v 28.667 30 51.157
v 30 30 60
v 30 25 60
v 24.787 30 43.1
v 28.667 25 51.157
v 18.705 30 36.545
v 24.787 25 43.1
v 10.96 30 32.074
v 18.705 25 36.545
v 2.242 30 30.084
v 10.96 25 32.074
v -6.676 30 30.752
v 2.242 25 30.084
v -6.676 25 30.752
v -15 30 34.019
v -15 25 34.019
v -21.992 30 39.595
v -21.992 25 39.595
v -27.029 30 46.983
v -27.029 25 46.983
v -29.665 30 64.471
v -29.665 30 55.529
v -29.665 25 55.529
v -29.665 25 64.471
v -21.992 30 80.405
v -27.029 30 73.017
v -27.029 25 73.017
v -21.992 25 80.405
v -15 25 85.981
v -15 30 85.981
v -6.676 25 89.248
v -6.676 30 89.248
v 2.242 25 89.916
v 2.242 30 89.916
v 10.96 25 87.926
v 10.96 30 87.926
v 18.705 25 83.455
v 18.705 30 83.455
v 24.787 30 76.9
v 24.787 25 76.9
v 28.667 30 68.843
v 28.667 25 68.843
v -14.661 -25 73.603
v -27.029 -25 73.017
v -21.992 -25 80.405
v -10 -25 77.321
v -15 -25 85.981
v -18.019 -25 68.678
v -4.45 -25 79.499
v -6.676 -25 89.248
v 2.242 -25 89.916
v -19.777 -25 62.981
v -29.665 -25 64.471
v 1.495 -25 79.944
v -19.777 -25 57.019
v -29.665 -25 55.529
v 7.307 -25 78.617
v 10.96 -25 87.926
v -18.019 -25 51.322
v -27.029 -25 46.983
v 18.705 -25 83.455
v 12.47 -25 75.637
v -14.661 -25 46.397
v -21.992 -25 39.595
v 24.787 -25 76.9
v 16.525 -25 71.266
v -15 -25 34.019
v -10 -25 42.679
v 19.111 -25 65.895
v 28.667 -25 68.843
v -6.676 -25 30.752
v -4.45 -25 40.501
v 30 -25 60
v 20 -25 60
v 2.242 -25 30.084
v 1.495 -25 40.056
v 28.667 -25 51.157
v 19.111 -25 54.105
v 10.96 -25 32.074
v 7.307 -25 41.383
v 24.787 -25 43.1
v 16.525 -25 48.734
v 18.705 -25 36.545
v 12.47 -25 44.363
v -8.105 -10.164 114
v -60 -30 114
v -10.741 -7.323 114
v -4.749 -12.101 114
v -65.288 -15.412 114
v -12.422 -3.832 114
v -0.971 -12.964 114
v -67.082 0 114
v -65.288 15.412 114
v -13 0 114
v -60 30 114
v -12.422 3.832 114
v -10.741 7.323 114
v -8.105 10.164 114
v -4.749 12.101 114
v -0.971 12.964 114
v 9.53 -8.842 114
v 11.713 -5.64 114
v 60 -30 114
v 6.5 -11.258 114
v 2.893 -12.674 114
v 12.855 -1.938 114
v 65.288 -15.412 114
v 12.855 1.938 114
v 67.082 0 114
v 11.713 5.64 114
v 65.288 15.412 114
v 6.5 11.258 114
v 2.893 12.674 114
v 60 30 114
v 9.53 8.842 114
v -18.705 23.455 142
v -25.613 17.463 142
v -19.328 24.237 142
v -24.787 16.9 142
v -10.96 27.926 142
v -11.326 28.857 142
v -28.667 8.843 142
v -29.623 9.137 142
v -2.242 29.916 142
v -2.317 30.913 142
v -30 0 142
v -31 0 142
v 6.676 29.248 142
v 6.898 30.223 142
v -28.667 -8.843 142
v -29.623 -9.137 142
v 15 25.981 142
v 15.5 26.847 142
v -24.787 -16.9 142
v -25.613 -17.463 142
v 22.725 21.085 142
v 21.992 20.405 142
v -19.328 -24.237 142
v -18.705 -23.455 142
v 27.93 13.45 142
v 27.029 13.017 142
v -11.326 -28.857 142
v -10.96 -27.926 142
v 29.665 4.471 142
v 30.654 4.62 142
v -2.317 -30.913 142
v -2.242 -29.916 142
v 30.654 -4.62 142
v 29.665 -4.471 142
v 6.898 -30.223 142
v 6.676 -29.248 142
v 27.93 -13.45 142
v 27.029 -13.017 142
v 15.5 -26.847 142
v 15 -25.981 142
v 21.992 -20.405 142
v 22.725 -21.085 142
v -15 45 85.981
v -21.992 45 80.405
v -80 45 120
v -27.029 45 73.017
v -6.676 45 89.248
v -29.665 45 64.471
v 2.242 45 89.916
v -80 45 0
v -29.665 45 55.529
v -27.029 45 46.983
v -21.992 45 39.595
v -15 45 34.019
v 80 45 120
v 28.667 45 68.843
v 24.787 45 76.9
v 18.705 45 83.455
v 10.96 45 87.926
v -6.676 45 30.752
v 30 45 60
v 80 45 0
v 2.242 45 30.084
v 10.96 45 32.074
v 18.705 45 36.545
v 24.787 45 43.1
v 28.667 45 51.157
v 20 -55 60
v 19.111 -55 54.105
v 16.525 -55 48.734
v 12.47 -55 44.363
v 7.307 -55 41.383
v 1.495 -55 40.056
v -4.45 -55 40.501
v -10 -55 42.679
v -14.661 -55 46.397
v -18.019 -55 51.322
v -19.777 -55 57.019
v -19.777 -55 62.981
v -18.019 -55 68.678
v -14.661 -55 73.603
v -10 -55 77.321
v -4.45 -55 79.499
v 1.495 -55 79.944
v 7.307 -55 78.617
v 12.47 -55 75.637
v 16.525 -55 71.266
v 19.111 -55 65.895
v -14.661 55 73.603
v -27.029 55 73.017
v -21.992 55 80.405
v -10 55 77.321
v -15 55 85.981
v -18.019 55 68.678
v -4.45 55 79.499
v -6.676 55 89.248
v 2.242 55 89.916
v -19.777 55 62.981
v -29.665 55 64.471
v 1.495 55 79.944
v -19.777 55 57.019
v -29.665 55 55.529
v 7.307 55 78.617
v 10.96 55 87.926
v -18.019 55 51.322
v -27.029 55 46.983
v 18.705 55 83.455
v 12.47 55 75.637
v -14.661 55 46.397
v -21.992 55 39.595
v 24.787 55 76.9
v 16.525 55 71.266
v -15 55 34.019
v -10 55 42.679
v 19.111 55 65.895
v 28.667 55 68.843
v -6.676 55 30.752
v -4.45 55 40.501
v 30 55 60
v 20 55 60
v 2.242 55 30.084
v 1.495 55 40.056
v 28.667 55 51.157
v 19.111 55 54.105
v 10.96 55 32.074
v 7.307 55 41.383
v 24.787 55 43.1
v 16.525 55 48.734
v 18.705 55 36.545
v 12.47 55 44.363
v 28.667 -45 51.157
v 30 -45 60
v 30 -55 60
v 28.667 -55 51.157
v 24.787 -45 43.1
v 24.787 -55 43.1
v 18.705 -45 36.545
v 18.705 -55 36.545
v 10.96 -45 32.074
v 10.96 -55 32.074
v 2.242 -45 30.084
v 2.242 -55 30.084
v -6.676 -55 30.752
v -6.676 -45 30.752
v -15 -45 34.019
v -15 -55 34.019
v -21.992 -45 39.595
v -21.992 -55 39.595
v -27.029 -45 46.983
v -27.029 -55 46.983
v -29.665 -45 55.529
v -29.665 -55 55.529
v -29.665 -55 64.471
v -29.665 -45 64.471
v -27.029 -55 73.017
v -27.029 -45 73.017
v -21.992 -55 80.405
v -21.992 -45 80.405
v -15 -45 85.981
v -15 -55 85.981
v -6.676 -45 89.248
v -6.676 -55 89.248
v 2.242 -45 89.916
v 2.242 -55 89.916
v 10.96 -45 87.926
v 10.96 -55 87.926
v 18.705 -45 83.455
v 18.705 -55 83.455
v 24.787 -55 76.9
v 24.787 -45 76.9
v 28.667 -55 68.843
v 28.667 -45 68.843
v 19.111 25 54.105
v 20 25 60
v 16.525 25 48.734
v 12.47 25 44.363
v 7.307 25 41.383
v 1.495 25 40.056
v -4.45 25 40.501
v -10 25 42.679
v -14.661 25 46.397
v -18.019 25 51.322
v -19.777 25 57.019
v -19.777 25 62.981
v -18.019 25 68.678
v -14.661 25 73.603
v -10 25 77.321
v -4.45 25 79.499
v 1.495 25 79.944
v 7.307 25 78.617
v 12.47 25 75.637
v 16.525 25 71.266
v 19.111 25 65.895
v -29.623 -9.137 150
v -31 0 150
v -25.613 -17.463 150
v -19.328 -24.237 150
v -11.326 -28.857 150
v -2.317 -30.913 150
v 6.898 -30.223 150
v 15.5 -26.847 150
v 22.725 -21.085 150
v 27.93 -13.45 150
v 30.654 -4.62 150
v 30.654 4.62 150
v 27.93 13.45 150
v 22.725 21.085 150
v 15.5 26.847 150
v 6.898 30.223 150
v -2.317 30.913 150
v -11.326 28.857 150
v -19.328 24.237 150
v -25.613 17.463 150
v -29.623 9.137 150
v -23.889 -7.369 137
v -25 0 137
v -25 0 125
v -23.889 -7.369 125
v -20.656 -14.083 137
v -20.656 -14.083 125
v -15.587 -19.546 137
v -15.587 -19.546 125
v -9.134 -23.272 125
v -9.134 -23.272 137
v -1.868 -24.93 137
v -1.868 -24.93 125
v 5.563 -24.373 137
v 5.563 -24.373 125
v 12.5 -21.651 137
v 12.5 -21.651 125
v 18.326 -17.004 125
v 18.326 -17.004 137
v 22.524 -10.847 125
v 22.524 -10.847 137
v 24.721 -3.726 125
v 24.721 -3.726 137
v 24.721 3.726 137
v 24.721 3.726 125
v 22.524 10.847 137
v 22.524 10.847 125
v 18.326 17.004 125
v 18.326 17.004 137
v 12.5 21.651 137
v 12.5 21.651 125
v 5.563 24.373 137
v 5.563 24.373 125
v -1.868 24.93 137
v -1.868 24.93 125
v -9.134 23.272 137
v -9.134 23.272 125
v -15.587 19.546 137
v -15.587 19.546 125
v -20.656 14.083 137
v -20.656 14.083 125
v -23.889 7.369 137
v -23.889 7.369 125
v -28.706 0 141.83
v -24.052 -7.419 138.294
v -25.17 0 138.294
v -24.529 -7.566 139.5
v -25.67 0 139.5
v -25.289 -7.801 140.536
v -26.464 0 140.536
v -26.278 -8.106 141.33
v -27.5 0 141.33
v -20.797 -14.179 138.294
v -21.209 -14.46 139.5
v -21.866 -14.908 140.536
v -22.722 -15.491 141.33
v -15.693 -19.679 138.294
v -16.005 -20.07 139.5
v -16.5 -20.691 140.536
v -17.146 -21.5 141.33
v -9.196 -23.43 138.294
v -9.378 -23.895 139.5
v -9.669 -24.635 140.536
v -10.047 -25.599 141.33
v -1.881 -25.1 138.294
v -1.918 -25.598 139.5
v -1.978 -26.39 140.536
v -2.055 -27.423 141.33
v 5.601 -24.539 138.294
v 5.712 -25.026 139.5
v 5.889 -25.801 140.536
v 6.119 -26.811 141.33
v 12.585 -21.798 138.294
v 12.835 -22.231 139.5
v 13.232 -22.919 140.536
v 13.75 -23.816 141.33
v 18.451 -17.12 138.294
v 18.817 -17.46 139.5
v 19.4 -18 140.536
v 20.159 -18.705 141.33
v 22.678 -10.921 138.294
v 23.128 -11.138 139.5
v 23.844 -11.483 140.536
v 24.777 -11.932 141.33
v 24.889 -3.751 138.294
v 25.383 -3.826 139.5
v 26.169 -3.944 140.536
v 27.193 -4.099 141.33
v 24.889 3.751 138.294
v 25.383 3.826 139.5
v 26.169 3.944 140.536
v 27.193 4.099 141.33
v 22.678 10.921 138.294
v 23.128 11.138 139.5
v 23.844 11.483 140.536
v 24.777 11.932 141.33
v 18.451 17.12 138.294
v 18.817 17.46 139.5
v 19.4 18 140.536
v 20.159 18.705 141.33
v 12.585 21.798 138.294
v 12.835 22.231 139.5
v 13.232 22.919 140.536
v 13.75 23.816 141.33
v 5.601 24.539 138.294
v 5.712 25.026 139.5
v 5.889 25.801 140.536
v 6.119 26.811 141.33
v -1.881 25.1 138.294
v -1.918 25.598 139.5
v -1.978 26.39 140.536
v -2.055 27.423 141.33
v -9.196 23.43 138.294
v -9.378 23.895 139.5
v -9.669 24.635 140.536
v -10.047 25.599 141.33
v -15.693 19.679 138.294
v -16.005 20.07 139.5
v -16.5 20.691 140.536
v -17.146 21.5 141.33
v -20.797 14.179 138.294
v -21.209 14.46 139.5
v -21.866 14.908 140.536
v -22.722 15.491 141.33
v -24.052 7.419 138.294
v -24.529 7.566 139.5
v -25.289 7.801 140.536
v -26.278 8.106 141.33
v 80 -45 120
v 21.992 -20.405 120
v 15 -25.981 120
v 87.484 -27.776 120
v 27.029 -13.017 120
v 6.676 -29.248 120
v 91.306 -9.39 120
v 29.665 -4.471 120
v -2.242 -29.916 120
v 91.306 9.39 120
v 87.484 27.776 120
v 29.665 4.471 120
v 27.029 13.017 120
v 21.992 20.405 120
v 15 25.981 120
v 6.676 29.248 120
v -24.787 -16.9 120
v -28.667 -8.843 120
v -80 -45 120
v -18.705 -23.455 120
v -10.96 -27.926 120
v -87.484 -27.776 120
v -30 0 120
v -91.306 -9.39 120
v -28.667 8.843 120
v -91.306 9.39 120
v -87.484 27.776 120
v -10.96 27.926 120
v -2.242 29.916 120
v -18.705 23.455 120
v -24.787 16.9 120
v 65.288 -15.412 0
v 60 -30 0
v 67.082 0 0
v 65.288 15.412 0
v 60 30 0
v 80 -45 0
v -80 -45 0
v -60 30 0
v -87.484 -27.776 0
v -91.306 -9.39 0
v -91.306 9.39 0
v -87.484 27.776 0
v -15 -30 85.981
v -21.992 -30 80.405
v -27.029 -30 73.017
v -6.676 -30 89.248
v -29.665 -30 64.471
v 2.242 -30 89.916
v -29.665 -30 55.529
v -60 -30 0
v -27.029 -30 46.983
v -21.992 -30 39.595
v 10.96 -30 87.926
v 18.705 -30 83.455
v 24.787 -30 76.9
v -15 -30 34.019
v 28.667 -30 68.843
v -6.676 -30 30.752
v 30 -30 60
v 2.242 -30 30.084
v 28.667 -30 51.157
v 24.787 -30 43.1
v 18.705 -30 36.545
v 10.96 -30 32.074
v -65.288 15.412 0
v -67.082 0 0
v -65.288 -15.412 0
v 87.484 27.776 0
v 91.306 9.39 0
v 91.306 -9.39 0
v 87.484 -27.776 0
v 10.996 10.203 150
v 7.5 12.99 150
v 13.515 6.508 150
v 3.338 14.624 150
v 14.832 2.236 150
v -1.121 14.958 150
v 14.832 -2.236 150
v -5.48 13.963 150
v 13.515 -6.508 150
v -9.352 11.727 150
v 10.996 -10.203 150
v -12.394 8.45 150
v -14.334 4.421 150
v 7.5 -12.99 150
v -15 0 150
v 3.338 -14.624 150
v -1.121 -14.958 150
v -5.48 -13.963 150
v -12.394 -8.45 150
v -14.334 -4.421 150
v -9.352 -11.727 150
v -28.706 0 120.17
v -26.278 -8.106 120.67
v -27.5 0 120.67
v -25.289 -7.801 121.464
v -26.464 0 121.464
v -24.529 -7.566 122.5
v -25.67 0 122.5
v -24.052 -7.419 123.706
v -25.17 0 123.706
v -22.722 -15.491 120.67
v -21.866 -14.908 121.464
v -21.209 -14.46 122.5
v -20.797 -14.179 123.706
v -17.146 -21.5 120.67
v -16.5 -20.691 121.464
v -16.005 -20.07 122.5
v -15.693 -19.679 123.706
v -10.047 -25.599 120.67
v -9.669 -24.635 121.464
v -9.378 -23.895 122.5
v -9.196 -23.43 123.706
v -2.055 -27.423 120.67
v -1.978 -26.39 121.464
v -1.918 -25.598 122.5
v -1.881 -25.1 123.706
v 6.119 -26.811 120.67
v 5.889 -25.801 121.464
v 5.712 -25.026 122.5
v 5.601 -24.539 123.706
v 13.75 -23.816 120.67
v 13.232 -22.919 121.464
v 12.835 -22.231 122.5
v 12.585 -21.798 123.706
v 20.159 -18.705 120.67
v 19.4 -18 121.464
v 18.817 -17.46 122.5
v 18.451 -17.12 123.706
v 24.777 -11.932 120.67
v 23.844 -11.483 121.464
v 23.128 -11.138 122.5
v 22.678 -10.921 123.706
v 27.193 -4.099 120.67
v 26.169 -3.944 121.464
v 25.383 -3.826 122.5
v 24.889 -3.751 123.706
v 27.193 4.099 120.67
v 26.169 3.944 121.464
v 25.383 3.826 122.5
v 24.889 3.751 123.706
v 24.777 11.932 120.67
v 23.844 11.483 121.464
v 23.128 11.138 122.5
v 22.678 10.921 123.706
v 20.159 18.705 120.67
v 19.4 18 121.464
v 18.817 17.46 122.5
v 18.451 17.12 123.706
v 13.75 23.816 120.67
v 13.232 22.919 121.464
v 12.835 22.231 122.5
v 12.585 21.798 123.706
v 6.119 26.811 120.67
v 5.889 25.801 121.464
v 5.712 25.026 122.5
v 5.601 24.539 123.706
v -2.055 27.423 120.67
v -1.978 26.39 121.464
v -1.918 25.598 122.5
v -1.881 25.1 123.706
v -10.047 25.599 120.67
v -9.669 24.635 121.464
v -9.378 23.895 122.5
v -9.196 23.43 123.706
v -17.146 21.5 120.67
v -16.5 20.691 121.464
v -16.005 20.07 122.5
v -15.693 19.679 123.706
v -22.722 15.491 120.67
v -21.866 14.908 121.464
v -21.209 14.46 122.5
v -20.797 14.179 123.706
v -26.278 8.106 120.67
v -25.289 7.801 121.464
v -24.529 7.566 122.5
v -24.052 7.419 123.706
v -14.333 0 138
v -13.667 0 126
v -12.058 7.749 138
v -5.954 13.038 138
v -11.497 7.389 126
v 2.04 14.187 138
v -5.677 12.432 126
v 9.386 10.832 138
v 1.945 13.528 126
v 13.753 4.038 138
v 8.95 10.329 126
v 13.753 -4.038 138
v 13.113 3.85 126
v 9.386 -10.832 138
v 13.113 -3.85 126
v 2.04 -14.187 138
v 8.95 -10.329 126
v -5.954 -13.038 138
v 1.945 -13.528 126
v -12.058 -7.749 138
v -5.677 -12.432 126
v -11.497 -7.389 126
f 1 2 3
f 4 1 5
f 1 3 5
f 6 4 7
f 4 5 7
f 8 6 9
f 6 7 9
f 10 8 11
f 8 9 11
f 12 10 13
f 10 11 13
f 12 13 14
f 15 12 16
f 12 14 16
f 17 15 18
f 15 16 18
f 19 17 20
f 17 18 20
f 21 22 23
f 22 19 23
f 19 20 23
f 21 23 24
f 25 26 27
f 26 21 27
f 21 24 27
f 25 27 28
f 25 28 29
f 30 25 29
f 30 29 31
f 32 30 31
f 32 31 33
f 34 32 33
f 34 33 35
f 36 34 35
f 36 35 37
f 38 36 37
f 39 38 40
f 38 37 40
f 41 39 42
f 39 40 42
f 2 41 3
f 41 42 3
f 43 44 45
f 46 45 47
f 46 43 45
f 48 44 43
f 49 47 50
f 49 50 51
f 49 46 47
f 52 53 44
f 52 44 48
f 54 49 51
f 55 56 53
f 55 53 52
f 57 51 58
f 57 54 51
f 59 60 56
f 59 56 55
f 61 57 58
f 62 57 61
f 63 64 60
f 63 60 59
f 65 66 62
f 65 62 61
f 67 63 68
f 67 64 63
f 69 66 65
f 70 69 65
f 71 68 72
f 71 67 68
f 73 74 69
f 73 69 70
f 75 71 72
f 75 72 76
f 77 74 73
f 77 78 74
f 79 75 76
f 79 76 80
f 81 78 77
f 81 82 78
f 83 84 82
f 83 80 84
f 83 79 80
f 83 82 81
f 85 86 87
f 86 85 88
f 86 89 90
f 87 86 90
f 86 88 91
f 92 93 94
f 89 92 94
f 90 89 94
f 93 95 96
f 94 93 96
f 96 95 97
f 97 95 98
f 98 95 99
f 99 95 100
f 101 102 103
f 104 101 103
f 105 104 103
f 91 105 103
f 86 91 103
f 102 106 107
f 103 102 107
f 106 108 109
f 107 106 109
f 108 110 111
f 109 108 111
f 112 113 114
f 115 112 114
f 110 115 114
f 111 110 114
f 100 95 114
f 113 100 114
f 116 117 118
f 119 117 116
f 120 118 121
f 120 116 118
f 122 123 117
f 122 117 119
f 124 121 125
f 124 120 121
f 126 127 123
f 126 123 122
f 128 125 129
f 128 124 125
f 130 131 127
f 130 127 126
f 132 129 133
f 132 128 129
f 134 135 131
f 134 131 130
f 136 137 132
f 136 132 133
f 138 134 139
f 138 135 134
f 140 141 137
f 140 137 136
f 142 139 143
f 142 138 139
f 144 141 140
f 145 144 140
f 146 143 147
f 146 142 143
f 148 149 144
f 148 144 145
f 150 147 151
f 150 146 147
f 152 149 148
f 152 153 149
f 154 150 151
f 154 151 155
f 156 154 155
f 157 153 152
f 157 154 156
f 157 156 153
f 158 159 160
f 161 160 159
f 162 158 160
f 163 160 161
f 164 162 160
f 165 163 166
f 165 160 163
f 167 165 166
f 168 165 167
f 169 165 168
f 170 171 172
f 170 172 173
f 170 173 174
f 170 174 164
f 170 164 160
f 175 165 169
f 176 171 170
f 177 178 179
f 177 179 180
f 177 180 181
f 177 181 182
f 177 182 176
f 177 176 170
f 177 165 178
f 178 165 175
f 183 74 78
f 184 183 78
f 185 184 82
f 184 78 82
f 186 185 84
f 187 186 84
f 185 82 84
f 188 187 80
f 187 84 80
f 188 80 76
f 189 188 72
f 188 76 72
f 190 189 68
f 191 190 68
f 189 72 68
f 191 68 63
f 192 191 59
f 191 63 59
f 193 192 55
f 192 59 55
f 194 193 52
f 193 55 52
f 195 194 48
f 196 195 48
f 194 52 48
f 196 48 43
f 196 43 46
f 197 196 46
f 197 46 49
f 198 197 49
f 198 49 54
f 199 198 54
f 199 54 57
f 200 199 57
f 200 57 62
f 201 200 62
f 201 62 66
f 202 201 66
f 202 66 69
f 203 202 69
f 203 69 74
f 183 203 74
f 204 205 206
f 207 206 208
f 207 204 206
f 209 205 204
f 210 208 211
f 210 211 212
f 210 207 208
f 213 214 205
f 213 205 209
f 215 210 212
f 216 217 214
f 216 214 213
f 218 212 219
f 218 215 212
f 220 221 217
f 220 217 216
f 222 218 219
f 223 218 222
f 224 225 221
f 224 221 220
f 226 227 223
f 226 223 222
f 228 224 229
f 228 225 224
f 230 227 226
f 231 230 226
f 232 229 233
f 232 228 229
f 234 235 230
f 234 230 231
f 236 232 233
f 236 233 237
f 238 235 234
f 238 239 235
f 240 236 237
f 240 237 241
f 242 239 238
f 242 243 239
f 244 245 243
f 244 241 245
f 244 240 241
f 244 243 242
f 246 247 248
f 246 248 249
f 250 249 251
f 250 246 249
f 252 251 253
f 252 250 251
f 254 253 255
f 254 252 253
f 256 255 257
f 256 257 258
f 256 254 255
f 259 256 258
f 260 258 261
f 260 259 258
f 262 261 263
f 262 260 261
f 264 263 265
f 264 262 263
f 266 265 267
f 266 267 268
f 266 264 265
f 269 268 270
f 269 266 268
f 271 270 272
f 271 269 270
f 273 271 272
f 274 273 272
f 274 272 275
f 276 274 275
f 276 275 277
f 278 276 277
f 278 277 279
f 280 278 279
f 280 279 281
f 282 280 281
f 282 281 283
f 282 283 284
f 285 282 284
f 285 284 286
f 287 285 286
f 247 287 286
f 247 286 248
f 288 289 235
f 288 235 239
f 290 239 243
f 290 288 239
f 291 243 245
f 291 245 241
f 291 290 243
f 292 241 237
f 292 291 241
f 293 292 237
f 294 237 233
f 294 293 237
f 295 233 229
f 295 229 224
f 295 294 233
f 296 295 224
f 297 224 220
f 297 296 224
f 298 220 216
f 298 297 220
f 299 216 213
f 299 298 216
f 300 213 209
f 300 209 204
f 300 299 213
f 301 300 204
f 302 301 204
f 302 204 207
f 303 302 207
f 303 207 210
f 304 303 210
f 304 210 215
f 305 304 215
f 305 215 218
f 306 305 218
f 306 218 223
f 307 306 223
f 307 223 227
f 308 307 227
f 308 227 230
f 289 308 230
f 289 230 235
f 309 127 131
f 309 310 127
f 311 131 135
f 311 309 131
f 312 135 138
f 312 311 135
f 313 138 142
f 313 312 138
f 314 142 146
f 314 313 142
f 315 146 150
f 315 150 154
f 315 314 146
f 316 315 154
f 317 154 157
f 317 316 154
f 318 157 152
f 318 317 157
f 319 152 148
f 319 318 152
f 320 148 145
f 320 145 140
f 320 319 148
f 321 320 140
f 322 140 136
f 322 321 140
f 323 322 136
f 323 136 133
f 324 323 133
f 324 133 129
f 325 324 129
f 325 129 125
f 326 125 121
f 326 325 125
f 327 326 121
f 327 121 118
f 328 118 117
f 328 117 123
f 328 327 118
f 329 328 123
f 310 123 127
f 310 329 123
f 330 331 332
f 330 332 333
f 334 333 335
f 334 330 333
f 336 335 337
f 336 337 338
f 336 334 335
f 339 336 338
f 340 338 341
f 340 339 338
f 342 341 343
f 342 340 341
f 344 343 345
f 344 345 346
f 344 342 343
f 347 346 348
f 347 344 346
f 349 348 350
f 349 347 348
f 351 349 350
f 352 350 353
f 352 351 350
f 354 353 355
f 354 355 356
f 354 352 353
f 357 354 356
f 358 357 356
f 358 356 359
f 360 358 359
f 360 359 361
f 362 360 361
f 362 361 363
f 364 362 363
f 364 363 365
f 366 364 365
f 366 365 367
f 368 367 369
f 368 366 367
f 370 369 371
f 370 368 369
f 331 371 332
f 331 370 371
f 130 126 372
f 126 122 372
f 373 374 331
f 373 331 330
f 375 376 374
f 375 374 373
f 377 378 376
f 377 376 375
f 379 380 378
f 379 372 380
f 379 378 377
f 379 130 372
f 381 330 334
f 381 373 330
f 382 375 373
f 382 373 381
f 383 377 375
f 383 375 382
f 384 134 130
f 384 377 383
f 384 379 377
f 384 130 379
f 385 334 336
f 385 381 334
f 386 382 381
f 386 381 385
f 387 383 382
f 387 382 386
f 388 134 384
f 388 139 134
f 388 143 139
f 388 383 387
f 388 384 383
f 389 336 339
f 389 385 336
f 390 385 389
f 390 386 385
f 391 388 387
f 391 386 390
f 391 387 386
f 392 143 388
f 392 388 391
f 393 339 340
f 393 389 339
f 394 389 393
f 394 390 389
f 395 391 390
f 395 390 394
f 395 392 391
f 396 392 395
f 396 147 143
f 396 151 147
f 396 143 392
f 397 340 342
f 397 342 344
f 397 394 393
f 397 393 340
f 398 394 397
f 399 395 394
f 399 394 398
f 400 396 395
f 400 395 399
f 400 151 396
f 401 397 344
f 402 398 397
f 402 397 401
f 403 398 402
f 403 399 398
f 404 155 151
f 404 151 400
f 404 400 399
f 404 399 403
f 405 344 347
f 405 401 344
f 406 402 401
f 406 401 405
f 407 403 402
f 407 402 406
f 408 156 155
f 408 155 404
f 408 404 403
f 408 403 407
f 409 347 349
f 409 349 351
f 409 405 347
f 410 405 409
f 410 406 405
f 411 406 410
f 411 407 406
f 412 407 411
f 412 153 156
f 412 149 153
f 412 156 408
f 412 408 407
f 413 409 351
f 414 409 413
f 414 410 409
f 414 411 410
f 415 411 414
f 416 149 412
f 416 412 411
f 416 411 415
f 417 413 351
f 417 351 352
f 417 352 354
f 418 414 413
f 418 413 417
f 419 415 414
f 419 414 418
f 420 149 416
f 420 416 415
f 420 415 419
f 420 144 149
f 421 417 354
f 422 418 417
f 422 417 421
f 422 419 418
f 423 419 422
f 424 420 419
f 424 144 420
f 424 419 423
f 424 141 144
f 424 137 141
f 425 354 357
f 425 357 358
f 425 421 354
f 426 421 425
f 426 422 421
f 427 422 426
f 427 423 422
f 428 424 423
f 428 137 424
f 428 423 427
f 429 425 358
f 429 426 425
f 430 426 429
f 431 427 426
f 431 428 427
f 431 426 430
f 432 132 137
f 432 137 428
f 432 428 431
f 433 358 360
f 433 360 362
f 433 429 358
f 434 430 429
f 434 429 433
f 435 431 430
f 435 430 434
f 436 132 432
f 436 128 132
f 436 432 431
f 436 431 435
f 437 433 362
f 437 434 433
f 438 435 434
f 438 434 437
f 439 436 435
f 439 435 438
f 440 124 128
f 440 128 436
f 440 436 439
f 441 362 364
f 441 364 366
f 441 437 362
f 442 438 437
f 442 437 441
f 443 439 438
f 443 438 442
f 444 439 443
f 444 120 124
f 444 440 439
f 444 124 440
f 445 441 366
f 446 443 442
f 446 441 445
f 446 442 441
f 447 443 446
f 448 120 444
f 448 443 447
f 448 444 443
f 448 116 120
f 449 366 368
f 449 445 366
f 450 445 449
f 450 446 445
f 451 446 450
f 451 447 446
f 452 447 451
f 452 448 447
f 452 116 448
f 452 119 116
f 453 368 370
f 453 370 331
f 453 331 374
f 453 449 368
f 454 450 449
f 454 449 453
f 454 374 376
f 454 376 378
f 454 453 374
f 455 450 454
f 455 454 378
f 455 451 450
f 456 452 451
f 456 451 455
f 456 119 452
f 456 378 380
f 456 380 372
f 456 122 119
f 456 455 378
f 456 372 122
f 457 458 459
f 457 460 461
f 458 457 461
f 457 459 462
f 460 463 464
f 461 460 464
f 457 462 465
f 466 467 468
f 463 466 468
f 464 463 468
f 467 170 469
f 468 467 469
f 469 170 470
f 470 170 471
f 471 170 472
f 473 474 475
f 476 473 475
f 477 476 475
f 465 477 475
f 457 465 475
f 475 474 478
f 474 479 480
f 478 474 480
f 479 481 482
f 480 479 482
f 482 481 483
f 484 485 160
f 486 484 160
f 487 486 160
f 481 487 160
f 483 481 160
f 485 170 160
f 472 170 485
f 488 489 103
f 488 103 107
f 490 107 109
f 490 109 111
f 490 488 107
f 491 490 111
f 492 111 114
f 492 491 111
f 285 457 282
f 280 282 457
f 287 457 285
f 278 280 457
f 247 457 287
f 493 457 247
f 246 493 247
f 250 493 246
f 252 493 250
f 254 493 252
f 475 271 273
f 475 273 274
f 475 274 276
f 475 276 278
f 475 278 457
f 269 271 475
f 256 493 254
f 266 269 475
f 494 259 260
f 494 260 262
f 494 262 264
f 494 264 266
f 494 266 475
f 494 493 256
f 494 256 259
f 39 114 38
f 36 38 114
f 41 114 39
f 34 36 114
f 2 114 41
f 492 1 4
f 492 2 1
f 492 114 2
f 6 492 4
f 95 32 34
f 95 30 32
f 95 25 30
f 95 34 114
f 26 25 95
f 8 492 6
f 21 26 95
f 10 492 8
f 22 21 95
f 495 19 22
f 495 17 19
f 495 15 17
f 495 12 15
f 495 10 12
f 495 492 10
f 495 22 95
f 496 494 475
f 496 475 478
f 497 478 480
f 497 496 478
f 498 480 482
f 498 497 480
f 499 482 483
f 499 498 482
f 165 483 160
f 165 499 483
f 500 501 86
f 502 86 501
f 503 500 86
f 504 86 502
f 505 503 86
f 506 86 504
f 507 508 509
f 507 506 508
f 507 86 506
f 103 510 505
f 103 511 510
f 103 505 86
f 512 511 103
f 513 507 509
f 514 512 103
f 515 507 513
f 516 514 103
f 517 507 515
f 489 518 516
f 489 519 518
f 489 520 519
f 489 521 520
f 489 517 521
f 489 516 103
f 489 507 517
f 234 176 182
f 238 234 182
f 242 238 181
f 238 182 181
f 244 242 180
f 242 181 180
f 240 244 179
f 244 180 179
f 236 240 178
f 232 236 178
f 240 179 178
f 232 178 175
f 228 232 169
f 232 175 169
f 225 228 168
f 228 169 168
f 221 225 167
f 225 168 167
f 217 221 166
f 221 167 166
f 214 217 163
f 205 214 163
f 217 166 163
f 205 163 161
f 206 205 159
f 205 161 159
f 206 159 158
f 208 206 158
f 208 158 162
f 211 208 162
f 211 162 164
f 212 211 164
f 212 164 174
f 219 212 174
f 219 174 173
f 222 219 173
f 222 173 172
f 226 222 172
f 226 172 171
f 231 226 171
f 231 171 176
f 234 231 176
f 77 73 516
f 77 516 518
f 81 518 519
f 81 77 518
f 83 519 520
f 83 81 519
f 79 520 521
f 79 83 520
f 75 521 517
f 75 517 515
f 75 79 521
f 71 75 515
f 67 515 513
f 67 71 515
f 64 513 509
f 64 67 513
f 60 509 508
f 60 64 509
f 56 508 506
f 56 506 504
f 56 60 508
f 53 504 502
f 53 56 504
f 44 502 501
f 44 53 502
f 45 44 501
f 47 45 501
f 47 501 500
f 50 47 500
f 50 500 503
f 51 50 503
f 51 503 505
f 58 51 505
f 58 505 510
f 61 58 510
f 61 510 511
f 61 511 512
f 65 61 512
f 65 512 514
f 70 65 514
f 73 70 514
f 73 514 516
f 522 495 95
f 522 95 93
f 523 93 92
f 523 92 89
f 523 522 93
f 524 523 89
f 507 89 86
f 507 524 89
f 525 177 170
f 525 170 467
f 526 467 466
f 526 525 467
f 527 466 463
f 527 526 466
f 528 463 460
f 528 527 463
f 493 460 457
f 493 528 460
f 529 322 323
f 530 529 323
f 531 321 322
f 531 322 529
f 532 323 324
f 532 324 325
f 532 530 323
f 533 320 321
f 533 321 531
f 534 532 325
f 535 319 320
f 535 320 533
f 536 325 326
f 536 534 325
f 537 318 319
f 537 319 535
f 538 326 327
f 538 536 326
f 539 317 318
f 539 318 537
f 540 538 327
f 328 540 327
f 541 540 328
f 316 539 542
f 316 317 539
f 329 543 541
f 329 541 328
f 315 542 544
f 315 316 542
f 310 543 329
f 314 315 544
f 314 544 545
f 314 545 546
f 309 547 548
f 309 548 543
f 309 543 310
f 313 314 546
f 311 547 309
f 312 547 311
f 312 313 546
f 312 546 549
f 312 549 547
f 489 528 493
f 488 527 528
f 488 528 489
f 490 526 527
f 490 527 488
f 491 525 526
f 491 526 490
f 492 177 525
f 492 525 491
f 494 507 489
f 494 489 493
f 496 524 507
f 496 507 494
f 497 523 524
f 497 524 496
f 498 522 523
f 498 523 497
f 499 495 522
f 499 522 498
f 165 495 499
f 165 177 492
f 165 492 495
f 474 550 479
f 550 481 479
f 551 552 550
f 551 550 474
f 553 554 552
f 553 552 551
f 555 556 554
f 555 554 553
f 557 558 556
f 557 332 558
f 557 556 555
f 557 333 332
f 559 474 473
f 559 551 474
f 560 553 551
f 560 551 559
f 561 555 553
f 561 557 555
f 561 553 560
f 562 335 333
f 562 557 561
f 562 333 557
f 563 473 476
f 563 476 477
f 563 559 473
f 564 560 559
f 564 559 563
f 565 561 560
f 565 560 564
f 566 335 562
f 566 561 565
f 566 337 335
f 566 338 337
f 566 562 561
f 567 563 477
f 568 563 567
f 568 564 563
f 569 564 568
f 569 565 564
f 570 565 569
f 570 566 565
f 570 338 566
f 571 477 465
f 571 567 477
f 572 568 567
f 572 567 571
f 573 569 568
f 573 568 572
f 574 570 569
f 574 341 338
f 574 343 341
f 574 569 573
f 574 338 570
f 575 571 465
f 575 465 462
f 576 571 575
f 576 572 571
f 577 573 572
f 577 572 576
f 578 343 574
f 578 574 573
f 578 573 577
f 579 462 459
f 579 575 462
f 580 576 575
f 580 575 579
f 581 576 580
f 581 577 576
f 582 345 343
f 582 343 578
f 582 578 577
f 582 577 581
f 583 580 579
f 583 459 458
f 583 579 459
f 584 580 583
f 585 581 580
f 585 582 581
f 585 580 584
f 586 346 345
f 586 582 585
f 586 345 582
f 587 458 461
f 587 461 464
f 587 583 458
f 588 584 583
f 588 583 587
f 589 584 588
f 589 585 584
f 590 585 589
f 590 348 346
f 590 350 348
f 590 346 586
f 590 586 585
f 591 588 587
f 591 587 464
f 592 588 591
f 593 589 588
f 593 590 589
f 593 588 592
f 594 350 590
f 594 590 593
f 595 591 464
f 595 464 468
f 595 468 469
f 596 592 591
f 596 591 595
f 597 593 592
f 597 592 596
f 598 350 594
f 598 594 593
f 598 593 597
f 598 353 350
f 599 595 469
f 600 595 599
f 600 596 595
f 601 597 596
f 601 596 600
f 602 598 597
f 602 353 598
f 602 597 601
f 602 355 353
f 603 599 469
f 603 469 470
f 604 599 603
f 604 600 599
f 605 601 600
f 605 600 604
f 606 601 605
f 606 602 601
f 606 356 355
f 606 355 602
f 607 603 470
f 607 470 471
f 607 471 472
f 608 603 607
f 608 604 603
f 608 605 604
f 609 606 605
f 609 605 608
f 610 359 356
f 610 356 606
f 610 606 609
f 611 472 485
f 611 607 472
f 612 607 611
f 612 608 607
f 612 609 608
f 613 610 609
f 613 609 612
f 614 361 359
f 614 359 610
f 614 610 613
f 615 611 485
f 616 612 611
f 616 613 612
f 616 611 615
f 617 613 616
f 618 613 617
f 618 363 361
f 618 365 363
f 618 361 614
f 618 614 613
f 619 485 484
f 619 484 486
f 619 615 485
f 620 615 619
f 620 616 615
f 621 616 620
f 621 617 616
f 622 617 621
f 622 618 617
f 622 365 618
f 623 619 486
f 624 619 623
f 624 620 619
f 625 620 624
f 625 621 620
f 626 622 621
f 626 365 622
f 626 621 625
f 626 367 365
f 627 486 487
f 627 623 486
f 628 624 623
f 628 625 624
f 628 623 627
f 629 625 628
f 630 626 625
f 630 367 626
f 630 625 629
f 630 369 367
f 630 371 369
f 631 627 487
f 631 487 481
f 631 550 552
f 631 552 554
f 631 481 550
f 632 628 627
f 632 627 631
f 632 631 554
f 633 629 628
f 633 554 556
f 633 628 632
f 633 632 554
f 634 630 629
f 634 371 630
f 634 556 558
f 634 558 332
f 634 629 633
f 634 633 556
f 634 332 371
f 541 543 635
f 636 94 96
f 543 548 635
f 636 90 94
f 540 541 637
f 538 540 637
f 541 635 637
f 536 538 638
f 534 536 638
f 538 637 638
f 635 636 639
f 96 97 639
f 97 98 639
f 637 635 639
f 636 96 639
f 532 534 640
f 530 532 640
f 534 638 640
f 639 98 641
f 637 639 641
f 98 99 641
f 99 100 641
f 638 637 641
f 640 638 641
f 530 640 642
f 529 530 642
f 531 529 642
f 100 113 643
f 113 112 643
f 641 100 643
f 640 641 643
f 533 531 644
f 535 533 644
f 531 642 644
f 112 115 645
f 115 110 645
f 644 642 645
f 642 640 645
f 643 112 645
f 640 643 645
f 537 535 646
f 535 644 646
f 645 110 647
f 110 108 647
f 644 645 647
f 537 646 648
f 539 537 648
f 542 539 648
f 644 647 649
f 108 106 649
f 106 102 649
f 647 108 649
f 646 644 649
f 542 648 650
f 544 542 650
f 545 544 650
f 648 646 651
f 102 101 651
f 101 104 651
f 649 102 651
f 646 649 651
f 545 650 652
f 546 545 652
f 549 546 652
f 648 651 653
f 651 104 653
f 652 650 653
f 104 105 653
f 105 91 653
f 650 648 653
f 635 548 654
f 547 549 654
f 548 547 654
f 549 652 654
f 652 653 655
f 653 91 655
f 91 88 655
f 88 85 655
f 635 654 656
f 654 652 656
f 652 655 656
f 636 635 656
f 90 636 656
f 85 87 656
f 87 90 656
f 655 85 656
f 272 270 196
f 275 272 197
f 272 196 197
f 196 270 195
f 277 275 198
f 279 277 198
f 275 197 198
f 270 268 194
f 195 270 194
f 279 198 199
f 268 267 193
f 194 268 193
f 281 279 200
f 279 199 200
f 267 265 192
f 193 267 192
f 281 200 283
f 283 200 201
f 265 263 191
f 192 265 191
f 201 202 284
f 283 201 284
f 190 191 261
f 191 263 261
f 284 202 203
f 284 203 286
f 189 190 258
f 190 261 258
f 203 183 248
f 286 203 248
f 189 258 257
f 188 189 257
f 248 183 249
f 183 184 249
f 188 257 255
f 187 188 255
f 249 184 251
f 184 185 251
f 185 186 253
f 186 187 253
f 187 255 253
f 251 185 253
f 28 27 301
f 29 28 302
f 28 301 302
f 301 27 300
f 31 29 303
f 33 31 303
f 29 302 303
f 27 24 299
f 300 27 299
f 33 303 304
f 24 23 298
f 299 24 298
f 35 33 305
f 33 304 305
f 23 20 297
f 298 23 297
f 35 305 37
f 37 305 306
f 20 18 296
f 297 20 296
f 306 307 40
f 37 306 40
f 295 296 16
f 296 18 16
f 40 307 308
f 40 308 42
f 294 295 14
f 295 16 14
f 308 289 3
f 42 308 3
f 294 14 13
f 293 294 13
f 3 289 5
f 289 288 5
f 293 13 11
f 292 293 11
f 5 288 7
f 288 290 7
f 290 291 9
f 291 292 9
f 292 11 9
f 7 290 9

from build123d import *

# Parameters (mm, degrees)
EXTRUDE_1_DEPTH     = 120
CUT_EXTRUDE_1_DEPTH = 114
SKETCH_5_R          = 20
CUT_EXTRUDE_3_DEPTH = 91
EXTRUDE_START       = 25
SKETCH_6_R          = 30
SKETCH_6_R_2        = 20
EXTRUDE_2_DEPTH     = 30
FILLET_2_R          = 5
FILLET_3_R          = 5


with BuildPart() as part:
    # 草图1 → 凸台-拉伸1 (new body)
    with BuildSketch(Plane.XY):
        with BuildLine():
            Line((-80, 45), (80, 45))
            ThreePointArc((80, 45), (91.787798753, 0), (80, -45))
            Line((80, -45), (-80, -45))
            ThreePointArc((-80, -45), (-91.787798753, 0), (-80, 45))
        make_face()
    extrude(amount=EXTRUDE_1_DEPTH)

    # 草图3 → 切除-拉伸1 (cut)
    with BuildSketch(Plane(origin=(0, 0, 0), x_dir=(-1, 0, 0), z_dir=(0, 0, -1))):
        with BuildLine():
            Line((-60, 30), (60, 30))
            ThreePointArc((60, 30), (67.082039325, 0), (60, -30))
            Line((60, -30), (-60, -30))
            ThreePointArc((-60, -30), (-67.082039325, 0), (-60, 30))
        make_face()
    extrude(amount=-CUT_EXTRUDE_1_DEPTH, mode=Mode.SUBTRACT)

    # 草图5 → 切除-拉伸3 (cut, through all)
    with BuildSketch(Plane.XZ.offset(45)):
        with Locations((0, 60)):
            Circle(SKETCH_5_R)
    extrude(amount=-CUT_EXTRUDE_3_DEPTH, mode=Mode.SUBTRACT)

    # 草图6 → 凸台-拉伸2 (add)
    with BuildSketch(Plane(origin=(0, 0, 0), x_dir=(1, 0, 0), z_dir=(0, 1, 0)).offset(EXTRUDE_START)):
        with Locations((0, -60)):
            Circle(SKETCH_6_R)
        with Locations((0, -60)):
            Circle(SKETCH_6_R_2, mode=Mode.SUBTRACT)
    extrude_2 = extrude(amount=EXTRUDE_2_DEPTH)

    # 镜向1: 凸台-拉伸2 across plane
    add(extrude_2.mirror(Plane.ZX))

    # 草图9 → 旋转1 (revolve)
    with BuildSketch(Plane(origin=(0, 0, 0), x_dir=(1, 0, 0), z_dir=(0, 1, 0))):
        Polygon((0, -120), (-25, -120), (-25, -142), (-31, -142), (-31, -150), (0, -150), align=None)
    revolve(axis=Axis((0, 0, -35.705886154), (0, 0, 1)))

    # 圆角2
    fillet_2_edges = [part.edges().sort_by_distance(p)[0] for p in [
        (25, 0, 120),
    ]]
    fillet(fillet_2_edges, radius=FILLET_2_R)

    # 圆角3
    fillet_3_edges = [part.edges().sort_by_distance(p)[0] for p in [
        (25, 0, 142),
    ]]
    fillet(fillet_3_edges, radius=FILLET_3_R)

    # 草图10 → 切除-旋转1 (revolve, cut)
    with BuildSketch(Plane(origin=(0, 0, 0), x_dir=(1, 0, 0), z_dir=(0, 1, 0))):
        Polygon((0, -150), (-15, -150), (-12.5, -105), (0, -105), align=None)
    revolve(axis=Axis((0, 0, 161.939554525), (0, 0, -1)), mode=Mode.SUBTRACT)


solid = part.part
